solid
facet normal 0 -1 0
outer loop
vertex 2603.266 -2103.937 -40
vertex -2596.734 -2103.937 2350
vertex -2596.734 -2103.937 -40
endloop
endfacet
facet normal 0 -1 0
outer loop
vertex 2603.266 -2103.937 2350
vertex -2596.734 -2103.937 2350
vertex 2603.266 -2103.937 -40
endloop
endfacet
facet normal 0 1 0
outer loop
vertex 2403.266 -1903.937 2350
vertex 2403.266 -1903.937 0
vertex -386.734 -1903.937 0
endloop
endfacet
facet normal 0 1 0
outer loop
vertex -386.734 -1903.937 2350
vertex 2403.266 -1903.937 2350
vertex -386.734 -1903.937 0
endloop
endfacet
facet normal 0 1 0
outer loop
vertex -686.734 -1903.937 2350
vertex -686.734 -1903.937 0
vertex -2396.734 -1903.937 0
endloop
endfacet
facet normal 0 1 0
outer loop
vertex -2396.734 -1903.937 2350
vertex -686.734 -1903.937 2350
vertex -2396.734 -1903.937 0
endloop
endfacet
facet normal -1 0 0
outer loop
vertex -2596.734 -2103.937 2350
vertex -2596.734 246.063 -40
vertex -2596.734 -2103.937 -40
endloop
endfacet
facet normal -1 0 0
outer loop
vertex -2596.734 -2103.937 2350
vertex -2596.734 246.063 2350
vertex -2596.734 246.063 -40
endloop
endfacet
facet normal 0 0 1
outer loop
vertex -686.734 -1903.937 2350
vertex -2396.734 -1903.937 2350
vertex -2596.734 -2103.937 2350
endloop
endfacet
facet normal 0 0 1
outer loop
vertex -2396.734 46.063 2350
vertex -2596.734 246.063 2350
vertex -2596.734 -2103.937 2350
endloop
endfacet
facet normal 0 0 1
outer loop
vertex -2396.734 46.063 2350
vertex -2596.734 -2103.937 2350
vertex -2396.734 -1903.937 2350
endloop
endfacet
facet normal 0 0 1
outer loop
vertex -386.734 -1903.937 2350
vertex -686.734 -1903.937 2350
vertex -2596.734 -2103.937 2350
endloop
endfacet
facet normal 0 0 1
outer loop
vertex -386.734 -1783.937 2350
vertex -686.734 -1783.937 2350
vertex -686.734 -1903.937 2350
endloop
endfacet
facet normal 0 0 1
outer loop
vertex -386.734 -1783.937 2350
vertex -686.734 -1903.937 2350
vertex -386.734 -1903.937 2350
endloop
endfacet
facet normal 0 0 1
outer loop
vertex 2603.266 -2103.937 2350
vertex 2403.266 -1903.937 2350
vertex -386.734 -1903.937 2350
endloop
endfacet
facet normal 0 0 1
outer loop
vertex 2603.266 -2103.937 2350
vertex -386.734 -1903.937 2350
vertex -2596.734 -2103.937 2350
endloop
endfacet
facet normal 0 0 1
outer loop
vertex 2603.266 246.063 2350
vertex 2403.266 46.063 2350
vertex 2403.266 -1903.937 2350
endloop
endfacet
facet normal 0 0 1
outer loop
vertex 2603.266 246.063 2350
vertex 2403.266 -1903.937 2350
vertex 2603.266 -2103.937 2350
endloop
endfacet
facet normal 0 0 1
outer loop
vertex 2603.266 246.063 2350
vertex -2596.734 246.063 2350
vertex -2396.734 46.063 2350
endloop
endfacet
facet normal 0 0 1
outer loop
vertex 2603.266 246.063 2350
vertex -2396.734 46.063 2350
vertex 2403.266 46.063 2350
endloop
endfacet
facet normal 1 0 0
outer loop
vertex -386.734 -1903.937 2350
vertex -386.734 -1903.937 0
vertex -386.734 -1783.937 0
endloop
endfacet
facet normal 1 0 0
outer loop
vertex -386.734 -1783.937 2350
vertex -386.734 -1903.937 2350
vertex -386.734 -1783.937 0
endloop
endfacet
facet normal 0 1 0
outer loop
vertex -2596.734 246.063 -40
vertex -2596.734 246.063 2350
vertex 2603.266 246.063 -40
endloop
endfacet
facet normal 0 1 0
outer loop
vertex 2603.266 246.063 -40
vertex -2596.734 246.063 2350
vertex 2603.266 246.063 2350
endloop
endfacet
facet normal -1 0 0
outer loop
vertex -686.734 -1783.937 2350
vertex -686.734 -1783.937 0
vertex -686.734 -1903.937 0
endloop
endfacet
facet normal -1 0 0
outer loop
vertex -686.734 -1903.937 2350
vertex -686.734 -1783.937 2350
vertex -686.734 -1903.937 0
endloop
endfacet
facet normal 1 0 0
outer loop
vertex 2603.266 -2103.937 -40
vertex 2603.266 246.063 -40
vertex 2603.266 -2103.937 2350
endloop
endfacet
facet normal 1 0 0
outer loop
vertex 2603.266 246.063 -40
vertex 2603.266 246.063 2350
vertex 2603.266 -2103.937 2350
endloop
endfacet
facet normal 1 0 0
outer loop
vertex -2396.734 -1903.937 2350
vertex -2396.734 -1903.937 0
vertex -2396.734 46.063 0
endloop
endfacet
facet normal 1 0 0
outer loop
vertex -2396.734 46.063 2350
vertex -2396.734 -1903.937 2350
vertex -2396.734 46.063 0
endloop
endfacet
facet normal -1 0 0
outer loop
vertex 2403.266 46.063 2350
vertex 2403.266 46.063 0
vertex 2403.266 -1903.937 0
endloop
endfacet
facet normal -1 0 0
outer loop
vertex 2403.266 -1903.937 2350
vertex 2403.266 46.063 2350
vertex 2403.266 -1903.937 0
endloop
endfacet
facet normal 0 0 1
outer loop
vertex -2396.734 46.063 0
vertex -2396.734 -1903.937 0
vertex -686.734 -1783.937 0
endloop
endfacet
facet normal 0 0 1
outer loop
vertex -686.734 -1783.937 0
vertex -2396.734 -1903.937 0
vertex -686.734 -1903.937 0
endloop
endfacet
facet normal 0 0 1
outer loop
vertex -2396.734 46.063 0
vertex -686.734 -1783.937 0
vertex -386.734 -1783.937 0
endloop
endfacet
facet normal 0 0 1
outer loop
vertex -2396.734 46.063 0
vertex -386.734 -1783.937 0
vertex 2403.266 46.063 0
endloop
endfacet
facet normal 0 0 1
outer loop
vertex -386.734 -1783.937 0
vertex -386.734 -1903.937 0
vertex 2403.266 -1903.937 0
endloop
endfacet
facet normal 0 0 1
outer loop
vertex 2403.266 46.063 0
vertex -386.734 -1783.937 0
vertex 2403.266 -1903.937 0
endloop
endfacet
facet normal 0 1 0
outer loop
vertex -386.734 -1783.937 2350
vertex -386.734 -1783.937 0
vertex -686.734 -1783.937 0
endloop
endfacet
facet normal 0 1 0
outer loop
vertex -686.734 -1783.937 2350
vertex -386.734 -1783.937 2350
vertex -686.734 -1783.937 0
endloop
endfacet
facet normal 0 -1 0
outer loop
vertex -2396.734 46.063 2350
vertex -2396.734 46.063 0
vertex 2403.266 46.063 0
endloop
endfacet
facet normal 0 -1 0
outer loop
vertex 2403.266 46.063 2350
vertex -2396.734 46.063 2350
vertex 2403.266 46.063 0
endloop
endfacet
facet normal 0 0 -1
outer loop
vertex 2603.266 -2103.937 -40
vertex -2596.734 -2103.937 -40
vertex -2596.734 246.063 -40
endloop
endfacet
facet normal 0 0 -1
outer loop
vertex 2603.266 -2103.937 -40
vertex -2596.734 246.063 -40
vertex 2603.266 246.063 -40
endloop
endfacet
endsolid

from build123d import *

# Parameters (mm, degrees)
F0_W     = 5200
F0_H     = 2350
F1_DEPTH = 2350
F2_W     = 5200
F2_H     = 2350
F3_DEPTH = 40


with BuildPart() as f1:
    # F0 (on Top) → F1 (new body)
    with BuildSketch(Plane.XY):
        with Locations((3.265701, -928.936625)):
            Rectangle(F0_W, F0_H)
        Polygon((-2396.734299, -1903.936625), (-2396.734299, 46.063375), (2403.265701, 46.063375), (2403.265701, -1903.936625), (-386.734299, -1903.936625), (-386.734299, -1783.936625), (-686.734299, -1783.936625), (-686.734299, -1903.936625), (-736.734299, -1903.936625), (-1496.734299, -1903.936625), align=None, mode=Mode.SUBTRACT)
    extrude(amount=F1_DEPTH)

    # F2 (on face) → F3 (join)
    with BuildSketch(Plane(origin=(0, 0, 0), x_dir=(1, 0, 0), z_dir=(0, 0, -1))):
        with Locations((3.265701, 928.936625)):
            Rectangle(F2_W, F2_H)
    extrude(amount=F3_DEPTH)


solid = f1.part
